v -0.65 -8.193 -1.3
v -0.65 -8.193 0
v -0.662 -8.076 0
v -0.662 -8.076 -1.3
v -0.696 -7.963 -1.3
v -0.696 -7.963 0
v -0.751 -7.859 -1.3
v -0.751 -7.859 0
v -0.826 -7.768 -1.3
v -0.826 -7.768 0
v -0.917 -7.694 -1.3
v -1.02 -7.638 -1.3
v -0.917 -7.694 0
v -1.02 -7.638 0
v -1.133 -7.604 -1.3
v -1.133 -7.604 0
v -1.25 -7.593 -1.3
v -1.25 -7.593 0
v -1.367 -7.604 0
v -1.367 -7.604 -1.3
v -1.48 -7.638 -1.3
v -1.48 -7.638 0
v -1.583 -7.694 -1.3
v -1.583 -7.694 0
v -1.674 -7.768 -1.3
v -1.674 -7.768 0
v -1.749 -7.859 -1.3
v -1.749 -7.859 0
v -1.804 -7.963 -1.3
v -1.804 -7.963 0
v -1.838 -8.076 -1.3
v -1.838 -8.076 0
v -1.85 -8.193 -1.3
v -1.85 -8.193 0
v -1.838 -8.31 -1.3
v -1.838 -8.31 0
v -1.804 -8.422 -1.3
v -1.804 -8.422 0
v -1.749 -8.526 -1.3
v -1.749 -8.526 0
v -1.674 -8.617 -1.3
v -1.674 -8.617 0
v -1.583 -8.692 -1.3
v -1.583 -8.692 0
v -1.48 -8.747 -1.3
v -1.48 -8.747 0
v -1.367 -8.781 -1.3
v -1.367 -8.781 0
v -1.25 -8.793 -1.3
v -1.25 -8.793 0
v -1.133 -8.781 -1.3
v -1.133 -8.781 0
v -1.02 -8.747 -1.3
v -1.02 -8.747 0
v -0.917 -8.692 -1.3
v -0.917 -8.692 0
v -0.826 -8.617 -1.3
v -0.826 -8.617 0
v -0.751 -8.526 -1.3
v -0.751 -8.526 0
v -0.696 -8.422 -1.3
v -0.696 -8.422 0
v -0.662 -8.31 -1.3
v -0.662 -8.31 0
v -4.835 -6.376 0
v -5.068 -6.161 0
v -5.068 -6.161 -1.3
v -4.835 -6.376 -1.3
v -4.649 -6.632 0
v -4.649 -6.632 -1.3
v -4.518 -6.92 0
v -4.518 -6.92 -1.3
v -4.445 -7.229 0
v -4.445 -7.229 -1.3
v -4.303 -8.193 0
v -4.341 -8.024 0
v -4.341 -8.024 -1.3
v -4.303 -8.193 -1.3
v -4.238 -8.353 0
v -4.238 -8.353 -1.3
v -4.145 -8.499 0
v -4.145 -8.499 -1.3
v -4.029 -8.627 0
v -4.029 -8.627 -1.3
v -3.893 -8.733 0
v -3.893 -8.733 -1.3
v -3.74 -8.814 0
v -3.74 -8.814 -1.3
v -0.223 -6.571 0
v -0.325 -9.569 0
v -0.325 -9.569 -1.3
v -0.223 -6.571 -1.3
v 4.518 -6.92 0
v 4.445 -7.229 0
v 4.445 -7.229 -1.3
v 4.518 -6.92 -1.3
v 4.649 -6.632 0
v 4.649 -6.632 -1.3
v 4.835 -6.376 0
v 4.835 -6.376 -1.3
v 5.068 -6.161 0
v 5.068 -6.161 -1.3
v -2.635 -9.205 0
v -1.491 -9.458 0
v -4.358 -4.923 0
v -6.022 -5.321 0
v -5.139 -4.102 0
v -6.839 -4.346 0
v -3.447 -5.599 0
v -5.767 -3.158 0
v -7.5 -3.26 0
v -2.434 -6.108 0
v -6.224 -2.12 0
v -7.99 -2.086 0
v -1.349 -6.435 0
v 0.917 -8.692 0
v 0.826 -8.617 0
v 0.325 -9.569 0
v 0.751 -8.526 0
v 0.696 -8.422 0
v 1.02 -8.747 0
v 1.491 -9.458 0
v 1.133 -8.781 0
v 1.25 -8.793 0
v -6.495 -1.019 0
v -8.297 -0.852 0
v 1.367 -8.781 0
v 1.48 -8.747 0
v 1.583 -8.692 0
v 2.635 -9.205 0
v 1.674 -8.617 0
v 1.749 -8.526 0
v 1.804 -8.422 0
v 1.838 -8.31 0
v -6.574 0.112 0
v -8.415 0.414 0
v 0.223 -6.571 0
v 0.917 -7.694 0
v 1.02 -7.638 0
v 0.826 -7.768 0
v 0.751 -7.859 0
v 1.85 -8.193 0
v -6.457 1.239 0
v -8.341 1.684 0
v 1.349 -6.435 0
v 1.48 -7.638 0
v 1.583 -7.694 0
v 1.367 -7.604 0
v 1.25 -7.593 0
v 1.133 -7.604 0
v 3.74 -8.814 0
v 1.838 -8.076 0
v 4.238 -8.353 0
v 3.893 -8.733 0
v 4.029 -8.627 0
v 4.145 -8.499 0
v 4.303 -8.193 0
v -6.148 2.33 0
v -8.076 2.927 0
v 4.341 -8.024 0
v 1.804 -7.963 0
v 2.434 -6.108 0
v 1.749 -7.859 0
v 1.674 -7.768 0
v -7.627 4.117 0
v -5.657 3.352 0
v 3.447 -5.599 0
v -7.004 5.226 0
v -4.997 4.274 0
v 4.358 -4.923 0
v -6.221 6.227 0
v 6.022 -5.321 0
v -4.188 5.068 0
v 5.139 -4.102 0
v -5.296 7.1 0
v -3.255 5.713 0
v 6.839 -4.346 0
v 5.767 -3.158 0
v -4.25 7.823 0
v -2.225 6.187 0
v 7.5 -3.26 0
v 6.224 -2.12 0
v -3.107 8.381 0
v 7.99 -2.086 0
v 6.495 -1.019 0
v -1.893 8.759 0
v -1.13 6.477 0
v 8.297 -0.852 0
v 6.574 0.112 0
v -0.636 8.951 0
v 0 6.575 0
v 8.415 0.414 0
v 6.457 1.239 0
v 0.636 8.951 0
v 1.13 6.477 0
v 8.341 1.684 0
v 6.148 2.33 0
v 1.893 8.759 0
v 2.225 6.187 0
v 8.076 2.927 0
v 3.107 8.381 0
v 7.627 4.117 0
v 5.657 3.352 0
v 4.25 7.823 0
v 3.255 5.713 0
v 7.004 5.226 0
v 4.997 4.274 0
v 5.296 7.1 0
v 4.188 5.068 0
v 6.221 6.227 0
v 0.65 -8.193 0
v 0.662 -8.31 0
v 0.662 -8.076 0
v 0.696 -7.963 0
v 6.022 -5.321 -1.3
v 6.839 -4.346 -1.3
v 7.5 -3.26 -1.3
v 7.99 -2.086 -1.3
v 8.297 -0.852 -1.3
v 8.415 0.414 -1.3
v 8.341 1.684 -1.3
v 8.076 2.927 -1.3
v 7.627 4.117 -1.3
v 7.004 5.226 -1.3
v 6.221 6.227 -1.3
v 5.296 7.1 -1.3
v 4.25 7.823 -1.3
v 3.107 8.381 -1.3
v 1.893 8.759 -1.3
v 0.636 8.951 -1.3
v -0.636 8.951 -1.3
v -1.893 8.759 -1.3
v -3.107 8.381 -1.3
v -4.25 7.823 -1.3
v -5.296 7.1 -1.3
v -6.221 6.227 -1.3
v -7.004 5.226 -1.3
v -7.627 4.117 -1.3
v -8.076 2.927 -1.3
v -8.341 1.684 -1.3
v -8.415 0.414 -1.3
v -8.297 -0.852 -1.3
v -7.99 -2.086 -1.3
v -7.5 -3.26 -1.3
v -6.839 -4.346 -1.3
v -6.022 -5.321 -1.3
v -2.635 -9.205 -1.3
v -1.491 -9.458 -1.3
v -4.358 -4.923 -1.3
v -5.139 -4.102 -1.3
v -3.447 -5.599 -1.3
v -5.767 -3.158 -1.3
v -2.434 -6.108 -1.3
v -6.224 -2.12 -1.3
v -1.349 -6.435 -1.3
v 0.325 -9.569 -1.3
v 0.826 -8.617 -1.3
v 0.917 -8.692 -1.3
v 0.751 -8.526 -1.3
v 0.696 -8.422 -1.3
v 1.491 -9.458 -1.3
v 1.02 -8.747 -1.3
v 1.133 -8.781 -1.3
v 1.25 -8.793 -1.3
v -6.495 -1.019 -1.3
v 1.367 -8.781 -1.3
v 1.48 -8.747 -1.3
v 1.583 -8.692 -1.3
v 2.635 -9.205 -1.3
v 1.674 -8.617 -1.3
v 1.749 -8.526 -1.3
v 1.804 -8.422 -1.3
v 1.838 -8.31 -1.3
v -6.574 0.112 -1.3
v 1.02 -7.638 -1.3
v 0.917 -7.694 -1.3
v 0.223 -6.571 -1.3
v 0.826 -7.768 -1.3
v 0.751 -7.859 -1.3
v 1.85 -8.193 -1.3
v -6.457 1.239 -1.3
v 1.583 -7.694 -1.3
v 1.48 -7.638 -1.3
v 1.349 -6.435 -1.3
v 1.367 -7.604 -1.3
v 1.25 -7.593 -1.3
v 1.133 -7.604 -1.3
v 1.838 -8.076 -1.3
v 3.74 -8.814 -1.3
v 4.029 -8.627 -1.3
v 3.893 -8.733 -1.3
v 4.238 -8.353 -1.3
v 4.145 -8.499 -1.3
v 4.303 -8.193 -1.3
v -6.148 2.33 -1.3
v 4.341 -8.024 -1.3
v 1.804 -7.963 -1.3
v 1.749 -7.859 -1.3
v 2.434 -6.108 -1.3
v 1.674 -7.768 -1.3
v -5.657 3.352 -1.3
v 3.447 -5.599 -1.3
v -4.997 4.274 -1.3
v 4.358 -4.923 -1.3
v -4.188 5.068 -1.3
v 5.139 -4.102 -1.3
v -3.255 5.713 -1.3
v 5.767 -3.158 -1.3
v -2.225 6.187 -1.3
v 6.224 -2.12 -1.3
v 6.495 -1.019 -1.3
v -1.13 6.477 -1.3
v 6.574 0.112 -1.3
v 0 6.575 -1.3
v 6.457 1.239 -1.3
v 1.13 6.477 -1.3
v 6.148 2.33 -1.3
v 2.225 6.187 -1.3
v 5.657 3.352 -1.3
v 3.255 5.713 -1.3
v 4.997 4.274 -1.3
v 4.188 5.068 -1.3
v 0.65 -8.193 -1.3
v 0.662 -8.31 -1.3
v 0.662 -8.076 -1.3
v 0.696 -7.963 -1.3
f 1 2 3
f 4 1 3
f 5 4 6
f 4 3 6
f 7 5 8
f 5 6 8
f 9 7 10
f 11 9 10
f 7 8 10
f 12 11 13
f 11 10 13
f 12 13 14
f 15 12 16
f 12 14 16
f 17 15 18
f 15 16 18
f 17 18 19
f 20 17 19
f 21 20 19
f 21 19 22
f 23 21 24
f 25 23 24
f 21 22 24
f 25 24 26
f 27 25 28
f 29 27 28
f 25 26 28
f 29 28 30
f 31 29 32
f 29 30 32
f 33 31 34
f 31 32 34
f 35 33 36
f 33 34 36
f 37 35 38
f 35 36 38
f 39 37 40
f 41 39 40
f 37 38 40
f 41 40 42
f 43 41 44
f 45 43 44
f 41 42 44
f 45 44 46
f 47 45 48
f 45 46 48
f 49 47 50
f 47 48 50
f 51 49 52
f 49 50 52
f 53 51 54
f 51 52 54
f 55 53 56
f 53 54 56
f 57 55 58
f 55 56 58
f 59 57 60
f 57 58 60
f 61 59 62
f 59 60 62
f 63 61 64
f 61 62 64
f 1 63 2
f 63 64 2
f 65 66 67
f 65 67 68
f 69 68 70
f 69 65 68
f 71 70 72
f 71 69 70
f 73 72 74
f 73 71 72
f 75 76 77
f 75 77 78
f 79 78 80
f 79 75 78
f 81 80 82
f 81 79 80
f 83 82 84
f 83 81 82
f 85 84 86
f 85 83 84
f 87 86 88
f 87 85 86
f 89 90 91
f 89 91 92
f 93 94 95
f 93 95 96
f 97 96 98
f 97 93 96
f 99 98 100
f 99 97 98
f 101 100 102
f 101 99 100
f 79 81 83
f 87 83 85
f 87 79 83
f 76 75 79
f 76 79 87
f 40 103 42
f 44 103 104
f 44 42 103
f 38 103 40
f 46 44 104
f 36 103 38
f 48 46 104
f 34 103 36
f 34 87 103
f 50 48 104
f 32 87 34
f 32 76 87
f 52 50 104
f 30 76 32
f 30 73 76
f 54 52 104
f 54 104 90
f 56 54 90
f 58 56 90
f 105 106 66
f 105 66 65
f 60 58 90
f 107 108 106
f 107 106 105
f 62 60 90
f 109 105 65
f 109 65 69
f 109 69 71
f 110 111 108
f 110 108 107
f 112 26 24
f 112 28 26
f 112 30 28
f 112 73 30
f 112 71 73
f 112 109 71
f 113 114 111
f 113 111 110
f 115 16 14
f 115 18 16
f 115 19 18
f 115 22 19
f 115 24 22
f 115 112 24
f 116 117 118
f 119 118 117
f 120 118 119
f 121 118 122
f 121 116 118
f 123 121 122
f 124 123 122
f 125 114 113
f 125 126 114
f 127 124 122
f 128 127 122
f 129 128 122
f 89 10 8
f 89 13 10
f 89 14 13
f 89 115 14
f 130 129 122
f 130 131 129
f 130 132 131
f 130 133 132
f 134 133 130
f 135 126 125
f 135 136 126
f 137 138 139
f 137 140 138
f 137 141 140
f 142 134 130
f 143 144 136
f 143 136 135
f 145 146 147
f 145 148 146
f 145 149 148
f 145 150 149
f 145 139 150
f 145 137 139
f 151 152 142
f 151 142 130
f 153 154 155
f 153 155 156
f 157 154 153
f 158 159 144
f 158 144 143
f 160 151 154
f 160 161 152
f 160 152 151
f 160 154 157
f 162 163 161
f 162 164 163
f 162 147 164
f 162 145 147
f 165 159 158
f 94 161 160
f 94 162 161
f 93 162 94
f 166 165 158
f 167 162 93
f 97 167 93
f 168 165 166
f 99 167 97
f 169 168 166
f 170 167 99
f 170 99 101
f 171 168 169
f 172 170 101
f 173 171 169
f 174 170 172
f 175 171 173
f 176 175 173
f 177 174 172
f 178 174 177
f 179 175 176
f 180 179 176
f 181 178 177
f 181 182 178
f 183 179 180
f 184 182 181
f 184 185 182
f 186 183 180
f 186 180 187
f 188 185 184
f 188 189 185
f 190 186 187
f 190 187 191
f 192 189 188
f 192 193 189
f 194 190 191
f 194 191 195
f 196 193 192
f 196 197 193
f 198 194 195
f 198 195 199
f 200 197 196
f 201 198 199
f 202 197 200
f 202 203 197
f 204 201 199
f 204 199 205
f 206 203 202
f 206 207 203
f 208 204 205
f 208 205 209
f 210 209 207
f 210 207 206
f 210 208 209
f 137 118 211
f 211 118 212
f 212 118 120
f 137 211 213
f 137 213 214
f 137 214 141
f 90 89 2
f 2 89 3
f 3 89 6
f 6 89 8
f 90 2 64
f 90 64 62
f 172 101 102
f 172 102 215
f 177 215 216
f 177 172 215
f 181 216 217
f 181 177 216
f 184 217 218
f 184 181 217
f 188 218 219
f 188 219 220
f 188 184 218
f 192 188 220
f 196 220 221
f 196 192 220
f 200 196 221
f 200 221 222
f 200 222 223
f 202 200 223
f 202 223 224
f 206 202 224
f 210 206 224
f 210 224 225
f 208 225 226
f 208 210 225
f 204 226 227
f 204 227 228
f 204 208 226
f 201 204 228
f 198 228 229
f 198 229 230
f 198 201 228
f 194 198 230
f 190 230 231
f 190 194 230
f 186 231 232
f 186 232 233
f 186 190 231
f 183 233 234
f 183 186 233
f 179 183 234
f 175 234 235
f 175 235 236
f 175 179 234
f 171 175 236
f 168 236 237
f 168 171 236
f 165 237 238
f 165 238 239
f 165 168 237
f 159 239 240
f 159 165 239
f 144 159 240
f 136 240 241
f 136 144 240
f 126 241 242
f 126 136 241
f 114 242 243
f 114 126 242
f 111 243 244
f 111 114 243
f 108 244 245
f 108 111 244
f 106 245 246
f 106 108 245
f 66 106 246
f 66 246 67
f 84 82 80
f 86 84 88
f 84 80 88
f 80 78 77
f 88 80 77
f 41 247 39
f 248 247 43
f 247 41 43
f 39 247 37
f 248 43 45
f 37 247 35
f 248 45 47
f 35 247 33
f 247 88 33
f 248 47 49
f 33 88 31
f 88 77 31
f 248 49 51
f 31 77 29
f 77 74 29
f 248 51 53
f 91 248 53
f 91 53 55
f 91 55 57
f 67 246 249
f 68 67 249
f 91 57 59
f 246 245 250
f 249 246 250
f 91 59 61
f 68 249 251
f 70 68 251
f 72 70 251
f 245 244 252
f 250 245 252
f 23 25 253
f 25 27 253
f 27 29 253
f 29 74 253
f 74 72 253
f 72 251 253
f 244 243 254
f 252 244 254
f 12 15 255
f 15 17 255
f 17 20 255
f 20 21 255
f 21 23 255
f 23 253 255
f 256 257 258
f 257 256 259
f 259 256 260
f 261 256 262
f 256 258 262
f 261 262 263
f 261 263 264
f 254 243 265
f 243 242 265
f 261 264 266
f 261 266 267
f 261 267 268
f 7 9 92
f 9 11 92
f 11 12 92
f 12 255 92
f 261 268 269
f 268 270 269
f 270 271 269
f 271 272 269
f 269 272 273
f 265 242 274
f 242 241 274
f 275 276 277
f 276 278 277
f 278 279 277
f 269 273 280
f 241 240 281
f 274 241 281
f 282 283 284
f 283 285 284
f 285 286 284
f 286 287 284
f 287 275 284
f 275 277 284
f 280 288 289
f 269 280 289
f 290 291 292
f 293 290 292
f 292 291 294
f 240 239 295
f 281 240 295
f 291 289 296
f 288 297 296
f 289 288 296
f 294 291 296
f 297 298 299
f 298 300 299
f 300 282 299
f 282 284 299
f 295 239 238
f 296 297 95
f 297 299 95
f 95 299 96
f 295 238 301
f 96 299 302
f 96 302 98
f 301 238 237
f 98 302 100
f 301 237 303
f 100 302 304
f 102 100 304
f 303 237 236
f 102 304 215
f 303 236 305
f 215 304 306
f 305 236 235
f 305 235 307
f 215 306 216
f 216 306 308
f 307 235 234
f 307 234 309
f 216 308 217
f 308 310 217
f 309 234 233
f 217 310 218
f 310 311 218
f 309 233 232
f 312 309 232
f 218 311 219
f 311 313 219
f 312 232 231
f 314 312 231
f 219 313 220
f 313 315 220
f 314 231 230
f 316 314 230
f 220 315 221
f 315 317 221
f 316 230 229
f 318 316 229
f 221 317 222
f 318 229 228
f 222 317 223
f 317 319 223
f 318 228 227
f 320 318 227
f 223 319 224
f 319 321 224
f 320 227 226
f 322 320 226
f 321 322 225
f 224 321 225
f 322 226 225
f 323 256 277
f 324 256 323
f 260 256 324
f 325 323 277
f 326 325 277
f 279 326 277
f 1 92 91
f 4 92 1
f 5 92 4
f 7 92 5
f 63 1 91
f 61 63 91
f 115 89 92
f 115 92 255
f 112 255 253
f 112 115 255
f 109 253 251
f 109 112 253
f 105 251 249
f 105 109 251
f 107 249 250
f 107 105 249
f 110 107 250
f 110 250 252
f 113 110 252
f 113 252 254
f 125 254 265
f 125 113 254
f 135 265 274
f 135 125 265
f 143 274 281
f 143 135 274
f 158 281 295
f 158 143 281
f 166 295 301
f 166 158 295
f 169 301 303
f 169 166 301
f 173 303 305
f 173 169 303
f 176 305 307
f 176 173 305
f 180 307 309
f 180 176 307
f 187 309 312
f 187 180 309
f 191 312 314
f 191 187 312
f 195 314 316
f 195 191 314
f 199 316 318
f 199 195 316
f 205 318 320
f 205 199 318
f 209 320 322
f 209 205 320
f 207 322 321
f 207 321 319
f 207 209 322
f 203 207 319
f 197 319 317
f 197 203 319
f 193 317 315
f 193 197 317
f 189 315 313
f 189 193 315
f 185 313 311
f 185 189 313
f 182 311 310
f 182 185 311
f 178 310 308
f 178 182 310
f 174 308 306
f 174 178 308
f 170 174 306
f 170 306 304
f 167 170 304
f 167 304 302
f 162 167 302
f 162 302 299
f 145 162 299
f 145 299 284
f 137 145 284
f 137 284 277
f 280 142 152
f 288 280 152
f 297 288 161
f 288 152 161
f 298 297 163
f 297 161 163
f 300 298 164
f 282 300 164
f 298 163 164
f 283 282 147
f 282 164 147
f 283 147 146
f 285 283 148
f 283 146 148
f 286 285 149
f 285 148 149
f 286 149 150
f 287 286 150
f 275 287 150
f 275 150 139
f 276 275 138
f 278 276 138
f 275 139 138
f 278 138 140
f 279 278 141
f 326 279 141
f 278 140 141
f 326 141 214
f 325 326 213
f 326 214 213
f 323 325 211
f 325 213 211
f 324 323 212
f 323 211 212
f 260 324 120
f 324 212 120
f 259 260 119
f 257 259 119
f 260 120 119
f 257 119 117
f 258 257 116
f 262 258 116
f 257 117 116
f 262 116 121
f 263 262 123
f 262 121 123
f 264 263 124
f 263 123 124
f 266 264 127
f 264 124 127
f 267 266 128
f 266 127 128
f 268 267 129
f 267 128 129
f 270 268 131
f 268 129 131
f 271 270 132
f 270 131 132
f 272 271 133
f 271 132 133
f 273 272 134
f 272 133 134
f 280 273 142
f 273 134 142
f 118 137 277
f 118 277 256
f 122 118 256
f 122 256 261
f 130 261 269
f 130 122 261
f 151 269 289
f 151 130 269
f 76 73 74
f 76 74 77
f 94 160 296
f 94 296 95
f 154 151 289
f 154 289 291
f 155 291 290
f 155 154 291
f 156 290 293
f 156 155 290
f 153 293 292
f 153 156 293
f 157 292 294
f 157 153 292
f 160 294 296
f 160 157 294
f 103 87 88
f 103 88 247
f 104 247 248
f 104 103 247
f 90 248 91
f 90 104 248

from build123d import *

# Parameters (mm, degrees)
BODYSKE_R  = 0.6
BODY_DEPTH = 1.3


with BuildPart() as part:
    # BodySke → Body (new body)
    with BuildSketch(Plane.XY):
        with BuildLine():
            Line((0.223172324, -6.571211389), (0.325, -9.569482745))
            ThreePointArc((0.325, -9.569482745), (2.067179303, -9.349192197), (3.739828154, -8.81443761))
            ThreePointArc((3.739828154, -8.81443761), (4.145198739, -8.499227928), (4.340690441, -8.024395905))
            Line((4.340690441, -8.024395905), (4.445467219, -7.228537259))
            ThreePointArc((4.445467219, -7.228537259), (4.649323286, -6.632069256), (5.06788143, -6.160751471))
            ThreePointArc((5.06788143, -6.160751471), (0, 8.975), (-5.06788143, -6.160751471))
            ThreePointArc((-5.06788143, -6.160751471), (-4.649323286, -6.632069256), (-4.445467219, -7.228537259))
            Line((-4.445467219, -7.228537259), (-4.340690441, -8.024395905))
            ThreePointArc((-4.340690441, -8.024395905), (-4.145198739, -8.499227928), (-3.739828154, -8.81443761))
            ThreePointArc((-3.739828154, -8.81443761), (-2.067179303, -9.349192197), (-0.325, -9.569482745))
            Line((-0.325, -9.569482745), (-0.223172324, -6.571211389))
            ThreePointArc((-0.223172324, -6.571211389), (0, 6.575), (0.223172324, -6.571211389))
        make_face()
        with Locations((1.25, -8.192689195)):
            Circle(BODYSKE_R, mode=Mode.SUBTRACT)
        with Locations((-1.25, -8.192689195)):
            Circle(BODYSKE_R, mode=Mode.SUBTRACT)
    extrude(amount=-BODY_DEPTH)


solid = part.part
